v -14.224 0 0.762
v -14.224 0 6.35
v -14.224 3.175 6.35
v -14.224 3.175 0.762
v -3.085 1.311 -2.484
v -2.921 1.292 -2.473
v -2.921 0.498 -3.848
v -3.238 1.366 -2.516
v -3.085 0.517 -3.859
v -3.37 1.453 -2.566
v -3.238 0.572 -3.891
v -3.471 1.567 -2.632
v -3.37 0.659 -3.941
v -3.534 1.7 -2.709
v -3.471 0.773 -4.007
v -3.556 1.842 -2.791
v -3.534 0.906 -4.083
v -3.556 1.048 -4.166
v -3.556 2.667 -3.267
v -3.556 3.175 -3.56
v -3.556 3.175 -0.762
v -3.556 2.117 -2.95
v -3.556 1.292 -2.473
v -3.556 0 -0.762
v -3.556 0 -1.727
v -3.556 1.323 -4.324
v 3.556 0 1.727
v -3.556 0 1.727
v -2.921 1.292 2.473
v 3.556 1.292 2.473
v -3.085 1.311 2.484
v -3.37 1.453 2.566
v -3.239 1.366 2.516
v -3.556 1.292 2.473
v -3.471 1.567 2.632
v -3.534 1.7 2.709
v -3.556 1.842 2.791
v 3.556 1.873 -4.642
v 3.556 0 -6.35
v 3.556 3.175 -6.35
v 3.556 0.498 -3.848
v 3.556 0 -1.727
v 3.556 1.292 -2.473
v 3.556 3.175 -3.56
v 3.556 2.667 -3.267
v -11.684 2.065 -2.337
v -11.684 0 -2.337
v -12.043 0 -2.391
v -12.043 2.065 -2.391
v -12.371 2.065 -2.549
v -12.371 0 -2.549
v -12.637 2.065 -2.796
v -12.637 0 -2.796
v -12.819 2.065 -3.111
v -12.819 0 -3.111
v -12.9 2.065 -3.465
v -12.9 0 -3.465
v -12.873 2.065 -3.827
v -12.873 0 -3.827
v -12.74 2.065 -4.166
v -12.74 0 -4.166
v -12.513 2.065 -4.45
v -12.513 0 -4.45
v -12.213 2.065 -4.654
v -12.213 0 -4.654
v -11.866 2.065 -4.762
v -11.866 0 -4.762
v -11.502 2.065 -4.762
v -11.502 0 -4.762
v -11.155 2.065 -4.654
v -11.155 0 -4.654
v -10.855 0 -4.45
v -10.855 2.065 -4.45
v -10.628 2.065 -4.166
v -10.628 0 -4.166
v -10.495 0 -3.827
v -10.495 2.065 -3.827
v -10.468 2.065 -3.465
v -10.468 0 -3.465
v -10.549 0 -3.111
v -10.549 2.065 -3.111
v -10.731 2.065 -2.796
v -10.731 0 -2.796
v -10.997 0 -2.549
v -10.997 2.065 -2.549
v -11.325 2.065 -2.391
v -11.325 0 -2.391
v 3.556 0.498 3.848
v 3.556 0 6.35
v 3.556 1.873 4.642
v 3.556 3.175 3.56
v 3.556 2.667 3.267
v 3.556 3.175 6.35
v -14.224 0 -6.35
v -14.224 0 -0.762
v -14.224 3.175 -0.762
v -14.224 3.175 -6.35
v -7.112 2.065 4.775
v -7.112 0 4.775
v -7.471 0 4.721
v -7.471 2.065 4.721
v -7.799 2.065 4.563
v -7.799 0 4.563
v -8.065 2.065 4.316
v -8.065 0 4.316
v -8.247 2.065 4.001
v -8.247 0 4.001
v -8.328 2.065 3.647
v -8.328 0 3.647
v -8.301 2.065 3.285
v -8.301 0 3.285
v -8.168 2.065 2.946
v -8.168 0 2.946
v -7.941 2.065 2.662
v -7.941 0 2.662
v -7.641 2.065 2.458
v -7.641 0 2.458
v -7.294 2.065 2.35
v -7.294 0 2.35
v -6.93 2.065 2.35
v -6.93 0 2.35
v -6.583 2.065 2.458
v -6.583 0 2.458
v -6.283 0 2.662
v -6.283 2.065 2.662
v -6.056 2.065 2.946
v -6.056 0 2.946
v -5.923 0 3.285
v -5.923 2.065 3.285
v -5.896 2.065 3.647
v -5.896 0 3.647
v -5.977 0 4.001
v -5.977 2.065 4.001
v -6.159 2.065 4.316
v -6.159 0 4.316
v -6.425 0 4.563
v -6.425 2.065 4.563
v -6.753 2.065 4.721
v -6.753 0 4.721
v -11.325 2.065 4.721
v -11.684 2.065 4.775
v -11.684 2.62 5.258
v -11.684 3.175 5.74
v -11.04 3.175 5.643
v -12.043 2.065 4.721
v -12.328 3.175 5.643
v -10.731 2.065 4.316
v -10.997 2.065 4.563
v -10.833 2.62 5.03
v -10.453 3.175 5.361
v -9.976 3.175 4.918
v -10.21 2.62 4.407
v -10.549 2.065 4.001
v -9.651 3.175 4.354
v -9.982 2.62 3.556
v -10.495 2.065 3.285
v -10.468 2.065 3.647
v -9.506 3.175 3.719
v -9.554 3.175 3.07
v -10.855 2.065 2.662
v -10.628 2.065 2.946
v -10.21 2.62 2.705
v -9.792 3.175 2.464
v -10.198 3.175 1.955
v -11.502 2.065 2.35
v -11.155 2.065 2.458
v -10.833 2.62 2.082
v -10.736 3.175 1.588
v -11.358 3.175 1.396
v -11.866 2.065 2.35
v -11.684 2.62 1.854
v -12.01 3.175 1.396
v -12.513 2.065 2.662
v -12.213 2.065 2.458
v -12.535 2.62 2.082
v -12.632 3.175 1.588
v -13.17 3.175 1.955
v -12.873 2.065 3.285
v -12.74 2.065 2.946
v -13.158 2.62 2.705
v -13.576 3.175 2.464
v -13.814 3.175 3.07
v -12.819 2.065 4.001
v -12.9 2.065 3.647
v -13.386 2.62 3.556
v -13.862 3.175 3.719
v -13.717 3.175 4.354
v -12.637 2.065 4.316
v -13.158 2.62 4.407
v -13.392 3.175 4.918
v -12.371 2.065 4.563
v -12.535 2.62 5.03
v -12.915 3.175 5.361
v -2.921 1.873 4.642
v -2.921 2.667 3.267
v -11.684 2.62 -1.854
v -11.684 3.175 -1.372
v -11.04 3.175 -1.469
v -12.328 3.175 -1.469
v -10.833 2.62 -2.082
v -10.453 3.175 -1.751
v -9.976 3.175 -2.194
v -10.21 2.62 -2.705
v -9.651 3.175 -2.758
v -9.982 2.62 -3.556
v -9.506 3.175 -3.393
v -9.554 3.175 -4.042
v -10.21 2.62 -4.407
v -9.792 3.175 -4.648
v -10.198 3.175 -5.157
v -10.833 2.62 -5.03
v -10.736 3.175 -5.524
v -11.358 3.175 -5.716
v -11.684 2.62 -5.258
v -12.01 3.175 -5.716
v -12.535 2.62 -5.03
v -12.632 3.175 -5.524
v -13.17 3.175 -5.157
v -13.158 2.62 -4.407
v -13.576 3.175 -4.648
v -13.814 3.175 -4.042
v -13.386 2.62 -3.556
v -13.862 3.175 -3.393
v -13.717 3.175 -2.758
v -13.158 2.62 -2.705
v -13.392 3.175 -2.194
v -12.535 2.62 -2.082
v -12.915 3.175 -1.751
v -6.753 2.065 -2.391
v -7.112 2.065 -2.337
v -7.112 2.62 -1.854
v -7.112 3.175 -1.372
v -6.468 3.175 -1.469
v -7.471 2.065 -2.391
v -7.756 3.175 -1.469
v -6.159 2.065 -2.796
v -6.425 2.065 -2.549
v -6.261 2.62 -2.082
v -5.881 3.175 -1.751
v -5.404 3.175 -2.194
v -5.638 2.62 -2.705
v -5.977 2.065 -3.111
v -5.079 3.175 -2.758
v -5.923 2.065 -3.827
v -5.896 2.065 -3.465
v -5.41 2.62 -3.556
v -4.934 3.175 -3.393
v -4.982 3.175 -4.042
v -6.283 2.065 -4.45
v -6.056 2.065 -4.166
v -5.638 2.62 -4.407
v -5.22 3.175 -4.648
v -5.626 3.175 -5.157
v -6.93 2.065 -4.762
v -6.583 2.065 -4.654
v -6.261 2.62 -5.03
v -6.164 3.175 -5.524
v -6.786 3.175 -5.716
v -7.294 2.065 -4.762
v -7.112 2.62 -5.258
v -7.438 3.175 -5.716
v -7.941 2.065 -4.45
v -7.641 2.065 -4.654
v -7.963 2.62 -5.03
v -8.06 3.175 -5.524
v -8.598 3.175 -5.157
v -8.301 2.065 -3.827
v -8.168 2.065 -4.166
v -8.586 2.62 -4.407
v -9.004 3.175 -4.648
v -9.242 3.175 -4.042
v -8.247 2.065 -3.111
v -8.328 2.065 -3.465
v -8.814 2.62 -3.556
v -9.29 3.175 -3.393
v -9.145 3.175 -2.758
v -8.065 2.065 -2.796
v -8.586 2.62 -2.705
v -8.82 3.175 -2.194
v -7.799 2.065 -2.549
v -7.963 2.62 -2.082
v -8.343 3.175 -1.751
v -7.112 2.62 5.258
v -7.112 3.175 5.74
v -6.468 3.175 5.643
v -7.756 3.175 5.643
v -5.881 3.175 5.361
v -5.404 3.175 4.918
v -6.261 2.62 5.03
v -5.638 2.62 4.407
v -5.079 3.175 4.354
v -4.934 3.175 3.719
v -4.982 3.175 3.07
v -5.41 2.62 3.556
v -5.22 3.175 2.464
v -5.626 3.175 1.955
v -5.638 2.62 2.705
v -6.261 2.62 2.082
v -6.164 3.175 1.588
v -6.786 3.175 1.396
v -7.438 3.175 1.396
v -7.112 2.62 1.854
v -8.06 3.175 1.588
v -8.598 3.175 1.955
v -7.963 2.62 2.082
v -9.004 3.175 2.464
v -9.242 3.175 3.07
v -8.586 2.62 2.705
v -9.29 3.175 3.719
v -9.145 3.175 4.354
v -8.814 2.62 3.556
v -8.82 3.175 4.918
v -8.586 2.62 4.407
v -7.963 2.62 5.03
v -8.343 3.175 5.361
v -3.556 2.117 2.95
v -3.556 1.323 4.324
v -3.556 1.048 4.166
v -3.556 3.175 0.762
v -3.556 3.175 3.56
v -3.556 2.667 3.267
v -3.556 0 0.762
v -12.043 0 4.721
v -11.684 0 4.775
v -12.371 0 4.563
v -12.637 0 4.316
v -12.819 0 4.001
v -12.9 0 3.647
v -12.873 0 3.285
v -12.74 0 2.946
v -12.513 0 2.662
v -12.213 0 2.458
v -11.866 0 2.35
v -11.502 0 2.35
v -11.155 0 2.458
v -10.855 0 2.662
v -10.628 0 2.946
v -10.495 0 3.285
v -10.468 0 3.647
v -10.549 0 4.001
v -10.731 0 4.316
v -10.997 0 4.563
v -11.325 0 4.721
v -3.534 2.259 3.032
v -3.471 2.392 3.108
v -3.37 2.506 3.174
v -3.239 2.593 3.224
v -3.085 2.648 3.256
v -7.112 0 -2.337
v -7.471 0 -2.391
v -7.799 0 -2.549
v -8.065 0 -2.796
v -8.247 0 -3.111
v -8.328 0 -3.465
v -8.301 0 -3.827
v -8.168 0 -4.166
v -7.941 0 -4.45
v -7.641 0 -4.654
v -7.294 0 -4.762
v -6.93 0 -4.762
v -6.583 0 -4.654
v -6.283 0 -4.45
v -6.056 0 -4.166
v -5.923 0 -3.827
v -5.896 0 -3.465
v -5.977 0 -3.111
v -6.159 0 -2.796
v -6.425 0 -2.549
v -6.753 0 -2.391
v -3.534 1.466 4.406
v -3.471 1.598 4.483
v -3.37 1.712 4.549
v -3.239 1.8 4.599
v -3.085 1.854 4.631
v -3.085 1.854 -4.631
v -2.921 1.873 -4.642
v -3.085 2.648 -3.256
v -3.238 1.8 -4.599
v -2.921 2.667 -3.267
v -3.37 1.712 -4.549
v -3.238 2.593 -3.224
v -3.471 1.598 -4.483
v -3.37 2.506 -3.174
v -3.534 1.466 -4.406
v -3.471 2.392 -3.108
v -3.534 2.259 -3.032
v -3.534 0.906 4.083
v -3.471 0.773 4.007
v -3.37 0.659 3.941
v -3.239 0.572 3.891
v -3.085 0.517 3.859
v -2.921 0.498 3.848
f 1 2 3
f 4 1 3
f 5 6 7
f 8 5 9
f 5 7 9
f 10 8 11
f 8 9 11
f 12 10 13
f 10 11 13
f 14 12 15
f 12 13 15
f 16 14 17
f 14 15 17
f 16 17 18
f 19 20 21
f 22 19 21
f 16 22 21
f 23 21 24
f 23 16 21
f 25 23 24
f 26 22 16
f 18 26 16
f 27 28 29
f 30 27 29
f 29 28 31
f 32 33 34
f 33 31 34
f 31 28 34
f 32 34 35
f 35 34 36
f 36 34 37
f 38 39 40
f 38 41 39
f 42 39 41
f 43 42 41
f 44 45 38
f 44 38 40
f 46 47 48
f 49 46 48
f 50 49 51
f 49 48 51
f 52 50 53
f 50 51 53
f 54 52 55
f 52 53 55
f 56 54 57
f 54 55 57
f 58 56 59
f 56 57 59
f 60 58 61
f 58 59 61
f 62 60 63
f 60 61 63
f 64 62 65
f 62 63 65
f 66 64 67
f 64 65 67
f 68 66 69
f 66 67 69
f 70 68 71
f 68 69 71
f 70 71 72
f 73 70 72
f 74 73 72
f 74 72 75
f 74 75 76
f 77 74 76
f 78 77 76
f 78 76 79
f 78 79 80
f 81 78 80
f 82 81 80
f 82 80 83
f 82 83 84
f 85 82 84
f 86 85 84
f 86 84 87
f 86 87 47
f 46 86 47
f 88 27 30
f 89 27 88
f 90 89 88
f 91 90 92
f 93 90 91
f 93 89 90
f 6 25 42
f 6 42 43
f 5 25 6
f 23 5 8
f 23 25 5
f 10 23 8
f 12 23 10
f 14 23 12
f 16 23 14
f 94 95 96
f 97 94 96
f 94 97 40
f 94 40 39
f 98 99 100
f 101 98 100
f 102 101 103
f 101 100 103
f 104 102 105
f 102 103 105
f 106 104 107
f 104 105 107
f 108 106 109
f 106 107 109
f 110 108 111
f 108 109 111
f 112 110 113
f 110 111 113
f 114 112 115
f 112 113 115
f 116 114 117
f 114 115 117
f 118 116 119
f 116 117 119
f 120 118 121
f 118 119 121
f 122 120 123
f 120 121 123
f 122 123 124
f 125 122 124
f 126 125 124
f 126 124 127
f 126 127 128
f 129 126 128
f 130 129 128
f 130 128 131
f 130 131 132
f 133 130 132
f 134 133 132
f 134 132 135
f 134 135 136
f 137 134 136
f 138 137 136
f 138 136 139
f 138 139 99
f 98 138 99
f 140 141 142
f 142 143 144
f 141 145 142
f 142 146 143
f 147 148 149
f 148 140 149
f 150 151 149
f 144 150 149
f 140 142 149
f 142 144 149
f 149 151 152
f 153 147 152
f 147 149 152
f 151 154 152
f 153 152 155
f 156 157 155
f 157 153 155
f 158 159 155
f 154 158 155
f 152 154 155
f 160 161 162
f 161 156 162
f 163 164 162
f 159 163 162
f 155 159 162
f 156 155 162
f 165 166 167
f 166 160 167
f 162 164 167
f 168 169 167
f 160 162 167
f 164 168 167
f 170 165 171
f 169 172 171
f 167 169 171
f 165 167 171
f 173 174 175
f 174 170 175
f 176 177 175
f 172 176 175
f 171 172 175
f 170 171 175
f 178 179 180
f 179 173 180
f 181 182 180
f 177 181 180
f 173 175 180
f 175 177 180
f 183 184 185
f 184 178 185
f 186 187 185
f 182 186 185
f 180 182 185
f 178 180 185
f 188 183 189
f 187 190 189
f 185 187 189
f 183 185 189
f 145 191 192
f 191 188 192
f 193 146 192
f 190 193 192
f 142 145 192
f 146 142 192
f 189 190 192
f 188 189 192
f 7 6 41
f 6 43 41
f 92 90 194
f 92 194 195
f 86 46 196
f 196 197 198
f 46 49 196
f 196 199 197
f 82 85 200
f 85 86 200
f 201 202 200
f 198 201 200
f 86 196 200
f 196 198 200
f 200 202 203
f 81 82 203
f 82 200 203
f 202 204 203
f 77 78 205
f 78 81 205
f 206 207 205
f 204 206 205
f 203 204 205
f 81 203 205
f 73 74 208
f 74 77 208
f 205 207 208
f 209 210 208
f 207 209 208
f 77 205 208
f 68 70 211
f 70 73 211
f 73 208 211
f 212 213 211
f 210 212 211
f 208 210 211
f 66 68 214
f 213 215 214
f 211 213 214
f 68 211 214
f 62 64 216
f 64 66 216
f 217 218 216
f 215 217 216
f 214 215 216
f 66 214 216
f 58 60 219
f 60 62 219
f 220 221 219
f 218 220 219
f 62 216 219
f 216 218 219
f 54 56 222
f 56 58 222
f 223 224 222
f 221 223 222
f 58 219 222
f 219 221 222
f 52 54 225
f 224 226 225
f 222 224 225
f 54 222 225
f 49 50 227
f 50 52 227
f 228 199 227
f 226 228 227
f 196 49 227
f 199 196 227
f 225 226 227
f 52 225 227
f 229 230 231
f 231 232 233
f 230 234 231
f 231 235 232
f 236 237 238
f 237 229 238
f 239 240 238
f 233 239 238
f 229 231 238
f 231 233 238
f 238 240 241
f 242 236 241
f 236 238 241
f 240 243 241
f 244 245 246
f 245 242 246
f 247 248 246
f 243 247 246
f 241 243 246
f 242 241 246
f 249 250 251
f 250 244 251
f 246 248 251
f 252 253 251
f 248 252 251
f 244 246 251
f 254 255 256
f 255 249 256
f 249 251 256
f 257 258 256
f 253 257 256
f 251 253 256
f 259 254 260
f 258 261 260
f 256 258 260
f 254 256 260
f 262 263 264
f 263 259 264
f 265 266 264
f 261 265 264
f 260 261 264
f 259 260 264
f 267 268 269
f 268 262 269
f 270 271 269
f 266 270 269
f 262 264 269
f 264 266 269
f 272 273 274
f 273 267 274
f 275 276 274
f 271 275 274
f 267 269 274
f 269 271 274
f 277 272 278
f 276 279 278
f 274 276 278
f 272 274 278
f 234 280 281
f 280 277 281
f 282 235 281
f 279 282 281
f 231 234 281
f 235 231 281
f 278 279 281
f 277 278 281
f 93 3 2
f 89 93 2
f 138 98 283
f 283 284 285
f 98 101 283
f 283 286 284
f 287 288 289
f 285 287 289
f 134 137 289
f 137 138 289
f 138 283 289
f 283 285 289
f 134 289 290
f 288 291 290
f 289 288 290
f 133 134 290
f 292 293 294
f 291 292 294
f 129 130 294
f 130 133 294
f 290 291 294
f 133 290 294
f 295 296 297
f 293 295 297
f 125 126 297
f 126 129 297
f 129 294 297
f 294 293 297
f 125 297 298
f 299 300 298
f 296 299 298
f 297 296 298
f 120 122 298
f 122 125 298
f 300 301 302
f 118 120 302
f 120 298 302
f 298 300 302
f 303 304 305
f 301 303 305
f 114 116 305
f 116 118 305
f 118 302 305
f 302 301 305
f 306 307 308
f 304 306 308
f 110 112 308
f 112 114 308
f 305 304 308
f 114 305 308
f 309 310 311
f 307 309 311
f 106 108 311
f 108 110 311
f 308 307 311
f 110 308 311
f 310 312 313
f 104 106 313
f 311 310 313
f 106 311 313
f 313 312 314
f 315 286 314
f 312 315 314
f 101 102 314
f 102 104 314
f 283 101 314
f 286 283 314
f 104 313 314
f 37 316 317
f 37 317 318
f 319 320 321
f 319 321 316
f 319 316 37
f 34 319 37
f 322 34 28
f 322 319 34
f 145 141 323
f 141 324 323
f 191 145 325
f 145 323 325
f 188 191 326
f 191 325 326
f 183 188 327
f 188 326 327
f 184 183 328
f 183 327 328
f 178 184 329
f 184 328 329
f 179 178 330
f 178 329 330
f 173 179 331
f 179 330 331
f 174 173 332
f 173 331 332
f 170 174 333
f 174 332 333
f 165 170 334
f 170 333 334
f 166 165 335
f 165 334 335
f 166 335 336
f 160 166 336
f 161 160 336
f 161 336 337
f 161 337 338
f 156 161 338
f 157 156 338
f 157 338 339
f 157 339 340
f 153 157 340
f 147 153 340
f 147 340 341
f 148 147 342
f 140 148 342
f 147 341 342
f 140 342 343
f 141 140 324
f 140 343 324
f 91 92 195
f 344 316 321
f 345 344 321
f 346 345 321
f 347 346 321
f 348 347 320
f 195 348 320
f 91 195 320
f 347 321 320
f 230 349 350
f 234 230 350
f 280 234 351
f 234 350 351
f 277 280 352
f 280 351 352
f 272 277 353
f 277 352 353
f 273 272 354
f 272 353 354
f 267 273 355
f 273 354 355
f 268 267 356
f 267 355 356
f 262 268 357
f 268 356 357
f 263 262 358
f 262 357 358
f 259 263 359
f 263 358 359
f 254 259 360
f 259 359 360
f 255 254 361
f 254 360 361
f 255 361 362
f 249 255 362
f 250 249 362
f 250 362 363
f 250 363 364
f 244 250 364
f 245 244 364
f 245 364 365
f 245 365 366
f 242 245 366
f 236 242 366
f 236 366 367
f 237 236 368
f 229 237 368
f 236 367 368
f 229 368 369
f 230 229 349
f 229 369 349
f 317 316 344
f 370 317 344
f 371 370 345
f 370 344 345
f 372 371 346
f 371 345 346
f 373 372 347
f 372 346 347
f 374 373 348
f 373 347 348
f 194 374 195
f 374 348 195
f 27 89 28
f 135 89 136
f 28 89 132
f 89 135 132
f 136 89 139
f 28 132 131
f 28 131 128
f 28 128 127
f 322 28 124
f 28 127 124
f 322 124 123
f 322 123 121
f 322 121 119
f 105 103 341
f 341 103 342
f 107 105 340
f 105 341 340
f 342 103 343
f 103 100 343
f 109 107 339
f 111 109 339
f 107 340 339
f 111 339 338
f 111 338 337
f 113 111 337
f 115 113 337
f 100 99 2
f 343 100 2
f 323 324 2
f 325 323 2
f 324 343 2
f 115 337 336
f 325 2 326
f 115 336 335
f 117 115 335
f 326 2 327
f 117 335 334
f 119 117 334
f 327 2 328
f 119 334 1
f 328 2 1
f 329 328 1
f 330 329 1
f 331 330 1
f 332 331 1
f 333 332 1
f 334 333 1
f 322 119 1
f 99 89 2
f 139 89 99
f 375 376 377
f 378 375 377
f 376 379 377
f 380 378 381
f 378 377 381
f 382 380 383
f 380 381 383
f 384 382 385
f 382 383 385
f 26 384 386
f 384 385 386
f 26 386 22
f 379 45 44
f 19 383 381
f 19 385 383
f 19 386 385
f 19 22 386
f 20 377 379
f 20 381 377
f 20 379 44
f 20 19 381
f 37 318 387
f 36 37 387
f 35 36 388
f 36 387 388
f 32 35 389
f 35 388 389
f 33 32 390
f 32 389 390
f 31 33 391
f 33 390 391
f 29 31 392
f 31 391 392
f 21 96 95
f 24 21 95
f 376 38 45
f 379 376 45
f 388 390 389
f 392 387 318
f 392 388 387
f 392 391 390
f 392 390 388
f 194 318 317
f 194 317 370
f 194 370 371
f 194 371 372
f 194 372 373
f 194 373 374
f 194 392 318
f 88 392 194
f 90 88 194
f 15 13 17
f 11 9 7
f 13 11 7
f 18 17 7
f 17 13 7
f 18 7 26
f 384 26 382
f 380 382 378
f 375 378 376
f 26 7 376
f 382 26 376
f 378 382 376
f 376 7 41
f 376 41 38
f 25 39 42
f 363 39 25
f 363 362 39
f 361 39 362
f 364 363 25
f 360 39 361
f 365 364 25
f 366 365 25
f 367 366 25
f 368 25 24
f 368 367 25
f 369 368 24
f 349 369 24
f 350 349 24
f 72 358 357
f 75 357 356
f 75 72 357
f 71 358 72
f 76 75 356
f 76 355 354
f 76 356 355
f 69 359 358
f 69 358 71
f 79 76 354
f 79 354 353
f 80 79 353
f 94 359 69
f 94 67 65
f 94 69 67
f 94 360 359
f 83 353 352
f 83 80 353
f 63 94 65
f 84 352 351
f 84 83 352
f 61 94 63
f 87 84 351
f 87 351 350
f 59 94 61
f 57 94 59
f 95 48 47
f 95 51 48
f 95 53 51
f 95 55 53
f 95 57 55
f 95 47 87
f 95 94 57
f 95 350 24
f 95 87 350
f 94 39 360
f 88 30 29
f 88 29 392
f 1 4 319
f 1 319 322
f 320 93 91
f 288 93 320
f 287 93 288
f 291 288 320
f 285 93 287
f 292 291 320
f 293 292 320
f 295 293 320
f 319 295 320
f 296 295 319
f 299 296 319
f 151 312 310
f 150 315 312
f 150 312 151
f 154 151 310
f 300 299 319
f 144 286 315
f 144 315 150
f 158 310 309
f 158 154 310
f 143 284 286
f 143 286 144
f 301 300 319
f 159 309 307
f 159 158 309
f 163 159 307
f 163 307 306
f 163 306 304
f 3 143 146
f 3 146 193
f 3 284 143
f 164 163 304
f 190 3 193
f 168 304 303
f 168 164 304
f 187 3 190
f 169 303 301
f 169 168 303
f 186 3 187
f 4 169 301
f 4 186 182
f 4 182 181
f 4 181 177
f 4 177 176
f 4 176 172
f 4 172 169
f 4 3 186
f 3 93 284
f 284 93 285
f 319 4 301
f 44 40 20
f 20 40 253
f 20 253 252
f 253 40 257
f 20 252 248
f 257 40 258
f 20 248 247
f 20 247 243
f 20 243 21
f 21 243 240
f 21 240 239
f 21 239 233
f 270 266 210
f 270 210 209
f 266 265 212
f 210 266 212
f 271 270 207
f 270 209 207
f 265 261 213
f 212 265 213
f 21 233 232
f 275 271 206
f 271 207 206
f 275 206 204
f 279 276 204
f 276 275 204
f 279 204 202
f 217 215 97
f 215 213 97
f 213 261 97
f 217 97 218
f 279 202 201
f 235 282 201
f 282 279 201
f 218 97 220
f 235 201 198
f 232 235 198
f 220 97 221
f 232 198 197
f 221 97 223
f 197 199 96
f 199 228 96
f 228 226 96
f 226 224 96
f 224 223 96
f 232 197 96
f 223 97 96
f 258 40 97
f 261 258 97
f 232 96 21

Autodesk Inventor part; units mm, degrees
ref_plane "YZ Plane" through (0, 0, 0) normal (1, 0, 0) x (0, 1, 0)
sketch "Sketch1" plane through (0, 0, 0) normal (1, 0, 0) x (0, 1, 0)
  line L0 (-2.2042, 0) -> (7.9897, 0) construction
  line L1 (0, -10.9768) -> (0, 10.9768) construction
  line L2 (0, -1.7272) -> (0, -6.35)
  line L3 (0, -1.7272) -> (0, -1.7272)
  line L4 (0, -1.7272) -> (3.175, -3.5603)
  line L5 (3.175, -3.5603) -> (3.175, -6.35)
  line L6 (3.175, -6.35) -> (0, -6.35)
  circle A0 centre (3.3584, 0) radius 3.175 construction
  line L7 (2.5647, 7.8406) -> (4.1522, 7.8406) construction
  line L8 (4.1522, 7.8406) -> (4.1522, -7.8406) construction
  line L9 (4.1522, -7.8406) -> (2.5647, -7.8406) construction
  line L10 (2.5647, -7.8406) -> (2.5647, 7.8406) construction
  line L11 (2.5647, 7.8406) -> (4.1522, -7.8406) construction
  line L12 (4.1522, 7.8406) -> (2.5647, -7.8406) construction
  line L13 (0, 1.7272) -> (0, 6.35)
  line L14 (0, 1.7272) -> (0, 1.7272)
  line L15 (0, 1.7272) -> (3.175, 3.5603)
  line L16 (3.175, 3.5603) -> (3.175, 6.35)
  line L17 (3.175, 6.35) -> (0, 6.35)
  point P0 (0, 0)
  point P1 (2.3851, -3.0222)
  point P2 (2.3851, 3.0222)
  point P3 (1.7709, 2.7496)
  point P4 (1.7709, -2.7496)
  dimension "bearing_angle" = 60
  dimension "d13" = 0
  dimension "bearing_thickness" = 3.175
  dimension "bearing_spacing" = 1.7272
  dimension "d17" = 6.35
  dimension "d18" = 1.5875
  dimension "d23" = 12.7
  dimension "d52" = 3.3584
  dimension "d78" = 0.3668
  dimension "flat_bearing_surface_height" = 2.794
sketch "Sketch11" plane through (0, 0, 0) normal (1, 0, 0) x (0, 1, 0)
  line L0 (3.175, 6.35) -> (0, 6.35) projected
  line L1 (3.175, -6.35) -> (0, -6.35) projected
  line L2 (-2.2042, 0) -> (7.9897, 0) construction
  line L3 (0, -10.9768) -> (0, 10.9768) construction
  line L4 (3.175, 6.35) -> (3.175, 0.762)
  line L5 (3.175, 0.762) -> (0, 0.762)
  line L6 (0, 6.35) -> (0, 0.762)
  line L7 (3.175, -6.35) -> (0, -6.35)
  line L8 (0, 10.9768) -> (0, -10.9768) construction
  line L9 (3.175, -6.35) -> (3.175, -0.762)
  line L10 (3.175, -0.762) -> (0, -0.762)
  line L11 (0, -6.35) -> (0, -0.762)
  point P0 (0, 0)
  dimension "d54" = 5.588
extrude "Extrusion4" add sketch "Sketch11" along normal blind 3.556 and the other way blind 14.224
sketch "Sketch17" plane through (3.556, 0, 0) normal (1, 0, 0) x (0, 0, -1)
  line L0 (-6.35, 3.175) -> (-0.762, 3.175) projected
  line L1 (-0.762, 3.175) -> (0.762, 3.175)
  line L2 (0.762, 3.175) -> (0.762, 0)
  line L3 (0.762, 0) -> (-0.762, 0)
  line L4 (-0.762, 0) -> (-0.762, 3.175)
  point P0 (0, 0)
ref_plane "Work Plane3" through (0, 3.175, 6.35) normal (1, 0, 0) x (0, -1, 0)
extrude "Extrusion6" [suppressed]
sketch "Sketch14" plane through (-14.224, 3.175, -6.35) normal (0, 1, 0) x (1, 0, 0)
  line L0 (-3.556, -6.35) -> (21.336, -6.35) projected
  line L1 (0, -5.588) -> (0, 0) projected
  point P0 (14.224, -6.35)
  point P1 (2.54, -2.794)
  point P2 (7.112, -2.794)
  point P3 (2.54, -9.906)
  point P4 (7.112, -9.906)
  dimension "hole1_setback" = 7.112
  dimension "hole2_setback" = 11.684
  dimension "hole_lateral" = 3.556
hole "Hole2" at (-11.684, 3.175, -3.556) at (-7.112, 3.175, -3.556) at (-11.684, 3.175, 3.556) at (-7.112, 3.175, 3.556) direction (0, -1, 0) diameter 2.4384 depth 6.6294 tip angle 118 countersink diameter 4.3688 countersink angle 82 clearance for "Flat Head Machine Screw (82)" size "#2" standard "Ansi Unified Screw Threads"
sketch "Sketch12" plane through (0, 3.175, 6.35) normal (1, 0, 0) x (0, -1, 0)
  line L0 (3.175, 4.6228) -> (0, 2.7897) projected
  line L1 (3.175, 8.0772) -> (0, 9.9103) projected
  line L2 (5.3792, 6.35) -> (-4.8147, 6.35) construction
  line L3 (3.175, 17.3268) -> (3.175, -4.6268) construction
  line L4 (3.175, 4.6228) -> (3.175, 7.0113)
  line L5 (3.175, 4.6228) -> (3.175, 4.6228)
  line L6 (3.175, 8.0772) -> (3.175, 8.0772)
  line L7 (3.175, 7.0113) -> (3.175, 8.0772)
  line L8 (0, 2.7897) -> (0, 9.9103)
  line L9 (0, 0) -> (0, 5.588) projected
  point P0 (3.175, 6.35)
extrude "Extrusion5" cut sketch "Sketch12" along normal mid plane 7.112
ref_plane "Work Plane4" through (0, 2.5647, -7.8406) normal (-1, 0, 0) x (0, 0, 1)
revolve "Revolution7" [suppressed]
sketch "Sketch13" plane through (0, 3.175, 6.35) normal (1, 0, 0) x (0, -1, 0)
  circle A0 centre (-0.1834, 6.35) radius 3.175 projected
  line L0 (5.3792, 6.35) -> (-4.8147, 6.35) construction
  line L1 (-3.3584, 6.35) -> (2.9916, 6.35)
  point P0 (3.175, 6.35)
revolve "Revolution6" [suppressed]
sketch "Sketch18" plane through (-3.556, 3.175, -3.5603) normal (0, 0.5, 0.866) x (1, 0, 0)
  circle A0 centre (3.556, -1.6213) radius 1.5748
  point P0 (3.556, -4.5298)
  point P1 (3.556, -1.6213)
  dimension "d80" = 3.1496
sketch "Sketch19" plane through (3.556, 0, 0) normal (1, 0, 0) x (0, 0, -1)
  circle A0 centre (3.437, 1.374) radius 0.7937
  line L0 (3.5603, 3.175) -> (1.7272, 0) projected
  point P0 (0, 0)
  point P1 (2.7496, 1.7709)
  dimension "d81" = 1.5875
sketch "Sketch20" plane through (-3.556, 3.175, -3.5603) normal (0, 0.5, 0.866) x (1, 0, 0)
  line L0 (0, 0.1438) -> (0, -3.6662) projected
  line L1 (7.112, 0) -> (7.112, -3.6662) projected
  line L2 (0, 0.1438) -> (7.112, 0.1438)
  line L3 (7.112, 0.1438) -> (7.112, -3.6662)
  line L4 (7.112, -3.6662) -> (0, -3.6662)
  line L5 (0, -3.6662) -> (0, 0.1438)
  point P0 (3.556, -4.5298)
  dimension "d86" = 3.81
extrude "Extrusion7" [suppressed]
extrude "Extrusion8" [suppressed]
sketch "Sketch21" plane through (3.556, 0, 0) normal (1, 0, 0) x (0, 0, -1)
  line L0 (-1.7272, 0) -> (-3.5603, 3.175) projected
  line L1 (-3.267, 2.667) -> (-2.4732, 1.2922)
  line L2 (-2.4732, 1.2922) -> (-3.8481, 0.4984)
  line L3 (-3.8481, 0.4984) -> (-4.6418, 1.8732)
  line L4 (-4.6418, 1.8732) -> (-3.267, 2.667)
  line L5 (0, -2.2042) -> (0, 7.9897) projected
  line L6 (3.267, 2.667) -> (2.4732, 1.2922)
  line L7 (2.4732, 1.2922) -> (3.8481, 0.4984)
  line L8 (3.8481, 0.4984) -> (4.6418, 1.8732)
  line L9 (4.6418, 1.8732) -> (3.267, 2.667)
  point P0 (0, 0)
  dimension "carbide_insert_width" = 1.5875
  dimension "d88" = 1.5875
  dimension "d89" = 0.508
extrude "Extrusion9" cut sketch "Sketch21" against normal blind 7.112
fillet "Fillet1" radius 0.635 4 edges at (-3.556, 2.2701, -3.9544) (-3.556, 0.8953, -3.1607) (-3.556, 0.8953, 3.1607) (-3.556, 2.2701, 3.9544)
sketch "Sketch16" plane through (0, 2.5647, -7.8406) normal (-1, 0, 0) x (0, 0, 1)
  line L0 (6.1134, -2.5647) -> (4.2803, 0.6103) projected
  line L1 (9.5678, -2.5647) -> (11.4008, 0.6103) projected
  line L2 (11.4008, 0.6103) -> (4.2803, 0.6103) projected
  line L3 (7.1793, -2.5647) -> (6.1134, -2.5647) projected
  line L4 (9.5678, -2.5647) -> (7.1793, -2.5647) projected
  line L5 (9.5678, -2.5647) -> (9.5678, -2.5647)
  line L6 (6.1134, -2.5647) -> (6.1134, -2.5647)
  line L7 (7.8406, -4.7688) -> (7.8406, 5.425) projected
  line L8 (7.8406, 0.6103) -> (7.8406, -2.5647)
properties part number "v2_bearing_insert_thick_parallel_REF" material "Stainless Steel, 440C"
